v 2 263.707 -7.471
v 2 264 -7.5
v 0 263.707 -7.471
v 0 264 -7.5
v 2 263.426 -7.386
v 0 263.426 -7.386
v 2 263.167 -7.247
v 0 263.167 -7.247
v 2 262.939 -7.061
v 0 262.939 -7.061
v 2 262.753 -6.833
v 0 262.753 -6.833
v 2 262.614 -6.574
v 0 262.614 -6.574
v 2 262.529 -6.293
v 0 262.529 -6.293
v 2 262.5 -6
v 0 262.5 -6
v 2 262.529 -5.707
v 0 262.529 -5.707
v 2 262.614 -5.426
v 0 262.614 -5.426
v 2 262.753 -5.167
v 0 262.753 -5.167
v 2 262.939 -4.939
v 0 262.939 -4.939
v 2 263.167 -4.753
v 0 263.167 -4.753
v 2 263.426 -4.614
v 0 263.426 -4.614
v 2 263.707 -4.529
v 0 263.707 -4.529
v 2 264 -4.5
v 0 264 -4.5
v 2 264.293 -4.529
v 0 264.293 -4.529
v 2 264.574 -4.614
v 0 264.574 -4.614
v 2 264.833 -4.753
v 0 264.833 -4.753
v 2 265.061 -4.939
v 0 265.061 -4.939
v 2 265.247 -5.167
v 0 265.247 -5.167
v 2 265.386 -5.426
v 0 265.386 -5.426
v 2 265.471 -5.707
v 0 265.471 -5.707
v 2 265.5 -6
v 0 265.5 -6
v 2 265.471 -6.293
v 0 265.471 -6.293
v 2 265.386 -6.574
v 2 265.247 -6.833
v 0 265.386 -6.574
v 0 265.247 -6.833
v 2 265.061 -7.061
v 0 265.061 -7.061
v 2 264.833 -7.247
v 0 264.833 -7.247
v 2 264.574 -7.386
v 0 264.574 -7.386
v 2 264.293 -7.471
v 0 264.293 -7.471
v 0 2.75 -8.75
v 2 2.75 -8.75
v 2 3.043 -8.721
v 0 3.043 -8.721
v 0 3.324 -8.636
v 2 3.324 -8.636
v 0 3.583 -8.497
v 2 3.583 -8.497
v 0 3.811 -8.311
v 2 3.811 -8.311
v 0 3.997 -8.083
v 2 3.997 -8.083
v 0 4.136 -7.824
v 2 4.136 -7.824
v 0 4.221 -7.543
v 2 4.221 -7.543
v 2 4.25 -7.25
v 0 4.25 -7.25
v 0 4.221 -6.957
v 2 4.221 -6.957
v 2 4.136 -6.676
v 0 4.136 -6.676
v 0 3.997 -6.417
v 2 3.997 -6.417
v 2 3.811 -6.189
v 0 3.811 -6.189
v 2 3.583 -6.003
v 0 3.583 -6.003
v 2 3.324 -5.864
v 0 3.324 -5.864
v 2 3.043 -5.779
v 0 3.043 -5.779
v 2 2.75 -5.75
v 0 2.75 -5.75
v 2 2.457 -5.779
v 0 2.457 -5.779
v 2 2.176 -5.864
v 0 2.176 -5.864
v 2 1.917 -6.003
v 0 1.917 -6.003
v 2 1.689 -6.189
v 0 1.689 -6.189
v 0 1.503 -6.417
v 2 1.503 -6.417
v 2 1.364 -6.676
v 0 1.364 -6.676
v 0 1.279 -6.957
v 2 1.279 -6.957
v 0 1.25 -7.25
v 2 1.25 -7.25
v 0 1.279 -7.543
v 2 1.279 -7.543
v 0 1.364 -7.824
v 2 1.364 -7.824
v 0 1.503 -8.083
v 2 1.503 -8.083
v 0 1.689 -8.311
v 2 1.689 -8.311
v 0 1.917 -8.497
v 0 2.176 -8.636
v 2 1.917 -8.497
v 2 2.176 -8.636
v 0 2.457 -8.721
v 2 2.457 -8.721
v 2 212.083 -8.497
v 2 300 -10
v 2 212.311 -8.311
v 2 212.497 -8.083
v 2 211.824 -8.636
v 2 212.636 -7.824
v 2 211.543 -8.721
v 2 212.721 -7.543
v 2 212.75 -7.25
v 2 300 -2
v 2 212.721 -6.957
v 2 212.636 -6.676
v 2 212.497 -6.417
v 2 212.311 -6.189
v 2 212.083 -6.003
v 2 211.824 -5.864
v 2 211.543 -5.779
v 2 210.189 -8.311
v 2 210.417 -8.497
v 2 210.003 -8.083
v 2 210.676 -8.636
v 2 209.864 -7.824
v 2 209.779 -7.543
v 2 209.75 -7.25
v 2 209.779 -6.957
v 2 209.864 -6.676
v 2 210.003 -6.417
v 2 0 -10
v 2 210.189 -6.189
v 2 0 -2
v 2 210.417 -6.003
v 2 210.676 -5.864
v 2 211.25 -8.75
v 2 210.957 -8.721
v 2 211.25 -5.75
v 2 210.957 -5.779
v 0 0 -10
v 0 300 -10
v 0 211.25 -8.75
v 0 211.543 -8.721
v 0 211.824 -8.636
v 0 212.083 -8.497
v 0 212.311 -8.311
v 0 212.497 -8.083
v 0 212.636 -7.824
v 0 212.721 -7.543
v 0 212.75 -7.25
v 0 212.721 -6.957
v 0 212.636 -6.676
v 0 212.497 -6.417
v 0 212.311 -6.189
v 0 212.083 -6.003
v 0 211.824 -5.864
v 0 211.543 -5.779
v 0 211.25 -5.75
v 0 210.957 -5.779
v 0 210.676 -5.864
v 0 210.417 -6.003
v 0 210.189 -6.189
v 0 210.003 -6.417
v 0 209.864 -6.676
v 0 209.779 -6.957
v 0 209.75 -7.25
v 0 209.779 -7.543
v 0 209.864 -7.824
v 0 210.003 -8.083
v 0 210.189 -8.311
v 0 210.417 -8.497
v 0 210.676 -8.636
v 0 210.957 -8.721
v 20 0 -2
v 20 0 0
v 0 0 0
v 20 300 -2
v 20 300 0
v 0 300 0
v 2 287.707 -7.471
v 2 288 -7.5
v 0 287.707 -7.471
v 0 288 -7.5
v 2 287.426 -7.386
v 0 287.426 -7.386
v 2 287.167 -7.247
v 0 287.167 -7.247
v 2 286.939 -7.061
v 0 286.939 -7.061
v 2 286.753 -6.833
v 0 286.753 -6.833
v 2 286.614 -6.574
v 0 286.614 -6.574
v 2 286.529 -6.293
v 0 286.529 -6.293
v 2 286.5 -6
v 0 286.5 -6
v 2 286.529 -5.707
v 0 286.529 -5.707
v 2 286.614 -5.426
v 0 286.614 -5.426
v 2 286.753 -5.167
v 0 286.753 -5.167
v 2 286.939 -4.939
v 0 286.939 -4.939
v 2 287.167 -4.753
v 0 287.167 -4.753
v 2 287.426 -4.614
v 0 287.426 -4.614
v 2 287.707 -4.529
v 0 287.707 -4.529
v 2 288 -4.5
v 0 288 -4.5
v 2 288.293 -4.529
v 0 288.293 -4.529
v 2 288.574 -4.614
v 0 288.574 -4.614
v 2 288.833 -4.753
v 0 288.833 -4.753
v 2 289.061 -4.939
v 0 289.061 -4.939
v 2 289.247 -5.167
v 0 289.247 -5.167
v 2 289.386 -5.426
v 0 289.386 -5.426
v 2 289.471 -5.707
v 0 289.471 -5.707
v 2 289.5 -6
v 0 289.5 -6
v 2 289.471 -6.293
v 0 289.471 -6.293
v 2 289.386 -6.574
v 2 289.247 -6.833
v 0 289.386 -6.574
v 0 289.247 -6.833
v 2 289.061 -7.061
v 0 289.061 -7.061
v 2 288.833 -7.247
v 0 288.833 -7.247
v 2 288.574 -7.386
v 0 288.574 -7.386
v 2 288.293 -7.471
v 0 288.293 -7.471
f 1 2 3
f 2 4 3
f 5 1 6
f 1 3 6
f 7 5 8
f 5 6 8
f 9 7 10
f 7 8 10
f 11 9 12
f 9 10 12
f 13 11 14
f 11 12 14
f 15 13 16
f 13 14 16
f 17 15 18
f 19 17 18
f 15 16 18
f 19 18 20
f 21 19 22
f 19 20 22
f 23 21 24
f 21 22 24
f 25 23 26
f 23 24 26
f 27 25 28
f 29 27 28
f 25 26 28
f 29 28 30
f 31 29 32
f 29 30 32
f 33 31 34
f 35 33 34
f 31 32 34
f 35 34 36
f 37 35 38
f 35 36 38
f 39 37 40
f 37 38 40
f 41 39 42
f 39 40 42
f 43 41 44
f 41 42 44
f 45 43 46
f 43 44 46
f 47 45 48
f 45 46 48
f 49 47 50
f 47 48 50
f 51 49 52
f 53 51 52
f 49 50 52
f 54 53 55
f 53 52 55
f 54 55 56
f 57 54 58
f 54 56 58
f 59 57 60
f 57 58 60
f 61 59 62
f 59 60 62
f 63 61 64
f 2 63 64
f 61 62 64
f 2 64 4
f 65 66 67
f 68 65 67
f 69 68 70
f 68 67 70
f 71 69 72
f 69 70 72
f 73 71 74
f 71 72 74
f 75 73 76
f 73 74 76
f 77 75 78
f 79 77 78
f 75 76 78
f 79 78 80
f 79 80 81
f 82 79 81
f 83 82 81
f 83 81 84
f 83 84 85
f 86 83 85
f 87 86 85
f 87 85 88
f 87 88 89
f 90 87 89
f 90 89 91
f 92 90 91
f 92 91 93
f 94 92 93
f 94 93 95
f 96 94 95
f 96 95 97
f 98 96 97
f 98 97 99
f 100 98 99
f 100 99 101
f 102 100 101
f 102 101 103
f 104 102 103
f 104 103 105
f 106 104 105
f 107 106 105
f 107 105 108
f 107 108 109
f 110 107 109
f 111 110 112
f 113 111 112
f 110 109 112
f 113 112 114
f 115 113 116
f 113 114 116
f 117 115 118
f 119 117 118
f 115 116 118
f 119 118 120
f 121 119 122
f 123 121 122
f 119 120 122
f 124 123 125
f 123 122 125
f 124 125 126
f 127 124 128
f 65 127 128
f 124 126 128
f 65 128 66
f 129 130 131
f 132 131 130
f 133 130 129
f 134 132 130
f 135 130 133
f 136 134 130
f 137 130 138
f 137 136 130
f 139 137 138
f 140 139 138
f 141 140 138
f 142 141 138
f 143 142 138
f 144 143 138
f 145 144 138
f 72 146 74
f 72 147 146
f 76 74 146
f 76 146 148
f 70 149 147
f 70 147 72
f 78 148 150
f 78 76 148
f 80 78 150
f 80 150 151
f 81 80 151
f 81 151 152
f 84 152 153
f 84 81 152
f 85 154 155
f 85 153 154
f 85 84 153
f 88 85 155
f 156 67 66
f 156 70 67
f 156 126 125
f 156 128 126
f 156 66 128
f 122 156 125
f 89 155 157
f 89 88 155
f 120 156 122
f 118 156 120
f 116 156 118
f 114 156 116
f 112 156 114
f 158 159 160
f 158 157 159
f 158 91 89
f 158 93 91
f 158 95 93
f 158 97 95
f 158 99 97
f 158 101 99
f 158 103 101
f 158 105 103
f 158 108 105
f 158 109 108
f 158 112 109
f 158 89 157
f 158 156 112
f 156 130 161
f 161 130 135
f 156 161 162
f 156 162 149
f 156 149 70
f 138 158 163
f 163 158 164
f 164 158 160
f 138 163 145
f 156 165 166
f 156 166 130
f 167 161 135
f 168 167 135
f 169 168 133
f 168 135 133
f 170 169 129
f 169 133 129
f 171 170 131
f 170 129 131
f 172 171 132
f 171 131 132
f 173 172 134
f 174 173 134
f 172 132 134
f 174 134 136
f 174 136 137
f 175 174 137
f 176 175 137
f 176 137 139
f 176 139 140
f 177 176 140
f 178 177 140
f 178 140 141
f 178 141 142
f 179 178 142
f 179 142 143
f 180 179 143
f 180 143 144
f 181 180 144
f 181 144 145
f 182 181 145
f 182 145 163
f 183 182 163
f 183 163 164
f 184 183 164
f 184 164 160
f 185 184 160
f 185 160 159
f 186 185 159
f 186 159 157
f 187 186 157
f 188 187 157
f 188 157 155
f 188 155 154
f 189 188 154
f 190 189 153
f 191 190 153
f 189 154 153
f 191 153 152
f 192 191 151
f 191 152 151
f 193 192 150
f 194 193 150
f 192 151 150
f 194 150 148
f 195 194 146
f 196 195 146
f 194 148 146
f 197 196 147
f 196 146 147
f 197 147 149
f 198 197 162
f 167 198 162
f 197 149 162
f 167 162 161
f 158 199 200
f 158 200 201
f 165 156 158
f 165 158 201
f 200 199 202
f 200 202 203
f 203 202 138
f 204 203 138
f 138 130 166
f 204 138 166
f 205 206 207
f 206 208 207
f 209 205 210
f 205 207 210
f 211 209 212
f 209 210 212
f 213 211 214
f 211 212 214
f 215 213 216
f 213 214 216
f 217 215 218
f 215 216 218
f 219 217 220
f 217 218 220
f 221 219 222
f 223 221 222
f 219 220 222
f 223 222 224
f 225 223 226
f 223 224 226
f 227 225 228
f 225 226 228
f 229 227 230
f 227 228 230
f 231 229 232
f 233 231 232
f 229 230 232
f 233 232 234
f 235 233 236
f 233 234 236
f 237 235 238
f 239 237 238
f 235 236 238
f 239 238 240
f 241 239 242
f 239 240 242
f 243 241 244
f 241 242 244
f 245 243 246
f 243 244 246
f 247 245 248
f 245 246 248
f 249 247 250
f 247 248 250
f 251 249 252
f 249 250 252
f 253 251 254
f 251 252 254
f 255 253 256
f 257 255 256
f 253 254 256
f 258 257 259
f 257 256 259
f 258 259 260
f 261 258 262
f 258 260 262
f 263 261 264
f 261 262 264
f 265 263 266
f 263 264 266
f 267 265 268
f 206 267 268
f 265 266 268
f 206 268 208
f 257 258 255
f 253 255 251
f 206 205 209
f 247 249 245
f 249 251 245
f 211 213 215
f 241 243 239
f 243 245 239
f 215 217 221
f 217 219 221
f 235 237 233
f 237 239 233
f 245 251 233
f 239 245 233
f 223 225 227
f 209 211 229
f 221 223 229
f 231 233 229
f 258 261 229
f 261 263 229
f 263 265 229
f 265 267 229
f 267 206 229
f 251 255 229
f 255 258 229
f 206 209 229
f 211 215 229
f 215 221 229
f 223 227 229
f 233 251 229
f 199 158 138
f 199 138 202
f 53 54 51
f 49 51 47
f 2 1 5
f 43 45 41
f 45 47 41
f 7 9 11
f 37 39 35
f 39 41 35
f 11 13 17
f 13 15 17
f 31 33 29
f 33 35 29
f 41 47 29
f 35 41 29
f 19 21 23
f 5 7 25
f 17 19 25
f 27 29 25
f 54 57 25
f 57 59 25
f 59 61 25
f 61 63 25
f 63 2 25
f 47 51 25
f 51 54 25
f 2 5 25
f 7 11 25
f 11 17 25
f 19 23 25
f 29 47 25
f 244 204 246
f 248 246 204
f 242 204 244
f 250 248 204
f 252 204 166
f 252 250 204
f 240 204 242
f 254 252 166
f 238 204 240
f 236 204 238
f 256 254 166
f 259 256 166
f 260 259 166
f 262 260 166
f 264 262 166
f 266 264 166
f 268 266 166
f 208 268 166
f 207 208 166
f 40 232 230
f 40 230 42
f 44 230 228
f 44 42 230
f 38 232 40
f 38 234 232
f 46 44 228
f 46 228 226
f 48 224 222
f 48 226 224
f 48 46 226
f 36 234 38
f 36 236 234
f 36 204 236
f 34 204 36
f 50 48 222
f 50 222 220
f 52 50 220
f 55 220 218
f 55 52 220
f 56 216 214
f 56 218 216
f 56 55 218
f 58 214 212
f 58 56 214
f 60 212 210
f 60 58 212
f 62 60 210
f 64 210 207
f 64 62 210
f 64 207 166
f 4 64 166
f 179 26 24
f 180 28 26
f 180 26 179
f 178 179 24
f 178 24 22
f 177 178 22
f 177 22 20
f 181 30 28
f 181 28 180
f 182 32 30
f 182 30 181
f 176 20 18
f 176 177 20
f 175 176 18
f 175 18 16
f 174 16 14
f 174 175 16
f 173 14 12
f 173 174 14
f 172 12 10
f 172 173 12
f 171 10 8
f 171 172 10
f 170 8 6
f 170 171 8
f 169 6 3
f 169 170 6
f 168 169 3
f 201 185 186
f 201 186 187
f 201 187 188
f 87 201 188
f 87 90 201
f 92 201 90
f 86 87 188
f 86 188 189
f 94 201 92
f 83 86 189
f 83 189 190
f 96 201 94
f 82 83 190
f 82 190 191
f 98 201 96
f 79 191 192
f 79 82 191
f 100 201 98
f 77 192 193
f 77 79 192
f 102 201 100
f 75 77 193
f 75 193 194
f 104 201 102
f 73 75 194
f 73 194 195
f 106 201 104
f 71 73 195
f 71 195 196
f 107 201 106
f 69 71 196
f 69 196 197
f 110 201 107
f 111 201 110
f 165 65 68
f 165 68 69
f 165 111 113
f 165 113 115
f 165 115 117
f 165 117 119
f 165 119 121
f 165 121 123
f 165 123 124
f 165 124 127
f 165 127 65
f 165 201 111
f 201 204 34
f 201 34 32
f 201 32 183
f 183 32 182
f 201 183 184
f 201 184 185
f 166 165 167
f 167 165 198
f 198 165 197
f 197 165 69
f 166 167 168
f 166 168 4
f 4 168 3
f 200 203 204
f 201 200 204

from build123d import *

# Parameters (mm, degrees)
BOSS_EXTRUDE1_DEPTH               = 300
F_3_0MM_DOWEL_HOLE1_D             = 3
F_3_0MM_DOWEL_HOLE2_D             = 3
SKETCH9_W                         = 1.5
SKETCH9_H                         = 1.999985051
F_3_0_3_DIAMETER_HOLE1_AT_2_COUNT = 2
F_3_0_3_DIAMETER_HOLE1_AT_2_PITCH = 24


with BuildPart() as part:
    # Sketch1 → Boss-Extrude1 (new body)
    with BuildSketch(Plane(origin=(0, 0, 0), x_dir=(1, 0, 0), z_dir=(0, 1, 0))):
        Polygon((0, 0), (0, 10), (2, 10), (2, 2), (20, 2), (20, 0), align=None)
    extrude(amount=BOSS_EXTRUDE1_DEPTH)

    # Ø3.0mm Dowel Hole1 (through all)
    with Locations(Plane.ZY):
        with Locations((-7.25, 2.75)):
            Hole(F_3_0MM_DOWEL_HOLE1_D / 2)

    # Ø3.0mm Dowel Hole2 (through all)
    with Locations(Plane.ZY):
        with Locations((-7.25, 211.25)):
            Hole(F_3_0MM_DOWEL_HOLE2_D / 2)

    # Sketch9 → Ø3.0 (3) Diameter Hole1 (revolve, cut)
    with BuildSketch(Plane(origin=(1.999985051, 288.000001132, -6.000000538), x_dir=(0, 0, -1), z_dir=(0, 1, 0))):
        with Locations((0.75, 0.999992526)):
            Rectangle(SKETCH9_W, SKETCH9_H)
    f_3_0_3_diameter_hole1 = revolve(axis=Axis((8.349985051, 288.000001132, -6.000000538), (-1, 0, 0)), mode=Mode.SUBTRACT)

    # Ø3.0 (3) Diameter Hole1 at 2: Ø3.0 (3) Diameter Hole1 ×2
    with Locations(*[(0, -i * F_3_0_3_DIAMETER_HOLE1_AT_2_PITCH, 0) for i in range(1, F_3_0_3_DIAMETER_HOLE1_AT_2_COUNT)]):
        add(f_3_0_3_diameter_hole1, mode=Mode.SUBTRACT)


solid = part.part
